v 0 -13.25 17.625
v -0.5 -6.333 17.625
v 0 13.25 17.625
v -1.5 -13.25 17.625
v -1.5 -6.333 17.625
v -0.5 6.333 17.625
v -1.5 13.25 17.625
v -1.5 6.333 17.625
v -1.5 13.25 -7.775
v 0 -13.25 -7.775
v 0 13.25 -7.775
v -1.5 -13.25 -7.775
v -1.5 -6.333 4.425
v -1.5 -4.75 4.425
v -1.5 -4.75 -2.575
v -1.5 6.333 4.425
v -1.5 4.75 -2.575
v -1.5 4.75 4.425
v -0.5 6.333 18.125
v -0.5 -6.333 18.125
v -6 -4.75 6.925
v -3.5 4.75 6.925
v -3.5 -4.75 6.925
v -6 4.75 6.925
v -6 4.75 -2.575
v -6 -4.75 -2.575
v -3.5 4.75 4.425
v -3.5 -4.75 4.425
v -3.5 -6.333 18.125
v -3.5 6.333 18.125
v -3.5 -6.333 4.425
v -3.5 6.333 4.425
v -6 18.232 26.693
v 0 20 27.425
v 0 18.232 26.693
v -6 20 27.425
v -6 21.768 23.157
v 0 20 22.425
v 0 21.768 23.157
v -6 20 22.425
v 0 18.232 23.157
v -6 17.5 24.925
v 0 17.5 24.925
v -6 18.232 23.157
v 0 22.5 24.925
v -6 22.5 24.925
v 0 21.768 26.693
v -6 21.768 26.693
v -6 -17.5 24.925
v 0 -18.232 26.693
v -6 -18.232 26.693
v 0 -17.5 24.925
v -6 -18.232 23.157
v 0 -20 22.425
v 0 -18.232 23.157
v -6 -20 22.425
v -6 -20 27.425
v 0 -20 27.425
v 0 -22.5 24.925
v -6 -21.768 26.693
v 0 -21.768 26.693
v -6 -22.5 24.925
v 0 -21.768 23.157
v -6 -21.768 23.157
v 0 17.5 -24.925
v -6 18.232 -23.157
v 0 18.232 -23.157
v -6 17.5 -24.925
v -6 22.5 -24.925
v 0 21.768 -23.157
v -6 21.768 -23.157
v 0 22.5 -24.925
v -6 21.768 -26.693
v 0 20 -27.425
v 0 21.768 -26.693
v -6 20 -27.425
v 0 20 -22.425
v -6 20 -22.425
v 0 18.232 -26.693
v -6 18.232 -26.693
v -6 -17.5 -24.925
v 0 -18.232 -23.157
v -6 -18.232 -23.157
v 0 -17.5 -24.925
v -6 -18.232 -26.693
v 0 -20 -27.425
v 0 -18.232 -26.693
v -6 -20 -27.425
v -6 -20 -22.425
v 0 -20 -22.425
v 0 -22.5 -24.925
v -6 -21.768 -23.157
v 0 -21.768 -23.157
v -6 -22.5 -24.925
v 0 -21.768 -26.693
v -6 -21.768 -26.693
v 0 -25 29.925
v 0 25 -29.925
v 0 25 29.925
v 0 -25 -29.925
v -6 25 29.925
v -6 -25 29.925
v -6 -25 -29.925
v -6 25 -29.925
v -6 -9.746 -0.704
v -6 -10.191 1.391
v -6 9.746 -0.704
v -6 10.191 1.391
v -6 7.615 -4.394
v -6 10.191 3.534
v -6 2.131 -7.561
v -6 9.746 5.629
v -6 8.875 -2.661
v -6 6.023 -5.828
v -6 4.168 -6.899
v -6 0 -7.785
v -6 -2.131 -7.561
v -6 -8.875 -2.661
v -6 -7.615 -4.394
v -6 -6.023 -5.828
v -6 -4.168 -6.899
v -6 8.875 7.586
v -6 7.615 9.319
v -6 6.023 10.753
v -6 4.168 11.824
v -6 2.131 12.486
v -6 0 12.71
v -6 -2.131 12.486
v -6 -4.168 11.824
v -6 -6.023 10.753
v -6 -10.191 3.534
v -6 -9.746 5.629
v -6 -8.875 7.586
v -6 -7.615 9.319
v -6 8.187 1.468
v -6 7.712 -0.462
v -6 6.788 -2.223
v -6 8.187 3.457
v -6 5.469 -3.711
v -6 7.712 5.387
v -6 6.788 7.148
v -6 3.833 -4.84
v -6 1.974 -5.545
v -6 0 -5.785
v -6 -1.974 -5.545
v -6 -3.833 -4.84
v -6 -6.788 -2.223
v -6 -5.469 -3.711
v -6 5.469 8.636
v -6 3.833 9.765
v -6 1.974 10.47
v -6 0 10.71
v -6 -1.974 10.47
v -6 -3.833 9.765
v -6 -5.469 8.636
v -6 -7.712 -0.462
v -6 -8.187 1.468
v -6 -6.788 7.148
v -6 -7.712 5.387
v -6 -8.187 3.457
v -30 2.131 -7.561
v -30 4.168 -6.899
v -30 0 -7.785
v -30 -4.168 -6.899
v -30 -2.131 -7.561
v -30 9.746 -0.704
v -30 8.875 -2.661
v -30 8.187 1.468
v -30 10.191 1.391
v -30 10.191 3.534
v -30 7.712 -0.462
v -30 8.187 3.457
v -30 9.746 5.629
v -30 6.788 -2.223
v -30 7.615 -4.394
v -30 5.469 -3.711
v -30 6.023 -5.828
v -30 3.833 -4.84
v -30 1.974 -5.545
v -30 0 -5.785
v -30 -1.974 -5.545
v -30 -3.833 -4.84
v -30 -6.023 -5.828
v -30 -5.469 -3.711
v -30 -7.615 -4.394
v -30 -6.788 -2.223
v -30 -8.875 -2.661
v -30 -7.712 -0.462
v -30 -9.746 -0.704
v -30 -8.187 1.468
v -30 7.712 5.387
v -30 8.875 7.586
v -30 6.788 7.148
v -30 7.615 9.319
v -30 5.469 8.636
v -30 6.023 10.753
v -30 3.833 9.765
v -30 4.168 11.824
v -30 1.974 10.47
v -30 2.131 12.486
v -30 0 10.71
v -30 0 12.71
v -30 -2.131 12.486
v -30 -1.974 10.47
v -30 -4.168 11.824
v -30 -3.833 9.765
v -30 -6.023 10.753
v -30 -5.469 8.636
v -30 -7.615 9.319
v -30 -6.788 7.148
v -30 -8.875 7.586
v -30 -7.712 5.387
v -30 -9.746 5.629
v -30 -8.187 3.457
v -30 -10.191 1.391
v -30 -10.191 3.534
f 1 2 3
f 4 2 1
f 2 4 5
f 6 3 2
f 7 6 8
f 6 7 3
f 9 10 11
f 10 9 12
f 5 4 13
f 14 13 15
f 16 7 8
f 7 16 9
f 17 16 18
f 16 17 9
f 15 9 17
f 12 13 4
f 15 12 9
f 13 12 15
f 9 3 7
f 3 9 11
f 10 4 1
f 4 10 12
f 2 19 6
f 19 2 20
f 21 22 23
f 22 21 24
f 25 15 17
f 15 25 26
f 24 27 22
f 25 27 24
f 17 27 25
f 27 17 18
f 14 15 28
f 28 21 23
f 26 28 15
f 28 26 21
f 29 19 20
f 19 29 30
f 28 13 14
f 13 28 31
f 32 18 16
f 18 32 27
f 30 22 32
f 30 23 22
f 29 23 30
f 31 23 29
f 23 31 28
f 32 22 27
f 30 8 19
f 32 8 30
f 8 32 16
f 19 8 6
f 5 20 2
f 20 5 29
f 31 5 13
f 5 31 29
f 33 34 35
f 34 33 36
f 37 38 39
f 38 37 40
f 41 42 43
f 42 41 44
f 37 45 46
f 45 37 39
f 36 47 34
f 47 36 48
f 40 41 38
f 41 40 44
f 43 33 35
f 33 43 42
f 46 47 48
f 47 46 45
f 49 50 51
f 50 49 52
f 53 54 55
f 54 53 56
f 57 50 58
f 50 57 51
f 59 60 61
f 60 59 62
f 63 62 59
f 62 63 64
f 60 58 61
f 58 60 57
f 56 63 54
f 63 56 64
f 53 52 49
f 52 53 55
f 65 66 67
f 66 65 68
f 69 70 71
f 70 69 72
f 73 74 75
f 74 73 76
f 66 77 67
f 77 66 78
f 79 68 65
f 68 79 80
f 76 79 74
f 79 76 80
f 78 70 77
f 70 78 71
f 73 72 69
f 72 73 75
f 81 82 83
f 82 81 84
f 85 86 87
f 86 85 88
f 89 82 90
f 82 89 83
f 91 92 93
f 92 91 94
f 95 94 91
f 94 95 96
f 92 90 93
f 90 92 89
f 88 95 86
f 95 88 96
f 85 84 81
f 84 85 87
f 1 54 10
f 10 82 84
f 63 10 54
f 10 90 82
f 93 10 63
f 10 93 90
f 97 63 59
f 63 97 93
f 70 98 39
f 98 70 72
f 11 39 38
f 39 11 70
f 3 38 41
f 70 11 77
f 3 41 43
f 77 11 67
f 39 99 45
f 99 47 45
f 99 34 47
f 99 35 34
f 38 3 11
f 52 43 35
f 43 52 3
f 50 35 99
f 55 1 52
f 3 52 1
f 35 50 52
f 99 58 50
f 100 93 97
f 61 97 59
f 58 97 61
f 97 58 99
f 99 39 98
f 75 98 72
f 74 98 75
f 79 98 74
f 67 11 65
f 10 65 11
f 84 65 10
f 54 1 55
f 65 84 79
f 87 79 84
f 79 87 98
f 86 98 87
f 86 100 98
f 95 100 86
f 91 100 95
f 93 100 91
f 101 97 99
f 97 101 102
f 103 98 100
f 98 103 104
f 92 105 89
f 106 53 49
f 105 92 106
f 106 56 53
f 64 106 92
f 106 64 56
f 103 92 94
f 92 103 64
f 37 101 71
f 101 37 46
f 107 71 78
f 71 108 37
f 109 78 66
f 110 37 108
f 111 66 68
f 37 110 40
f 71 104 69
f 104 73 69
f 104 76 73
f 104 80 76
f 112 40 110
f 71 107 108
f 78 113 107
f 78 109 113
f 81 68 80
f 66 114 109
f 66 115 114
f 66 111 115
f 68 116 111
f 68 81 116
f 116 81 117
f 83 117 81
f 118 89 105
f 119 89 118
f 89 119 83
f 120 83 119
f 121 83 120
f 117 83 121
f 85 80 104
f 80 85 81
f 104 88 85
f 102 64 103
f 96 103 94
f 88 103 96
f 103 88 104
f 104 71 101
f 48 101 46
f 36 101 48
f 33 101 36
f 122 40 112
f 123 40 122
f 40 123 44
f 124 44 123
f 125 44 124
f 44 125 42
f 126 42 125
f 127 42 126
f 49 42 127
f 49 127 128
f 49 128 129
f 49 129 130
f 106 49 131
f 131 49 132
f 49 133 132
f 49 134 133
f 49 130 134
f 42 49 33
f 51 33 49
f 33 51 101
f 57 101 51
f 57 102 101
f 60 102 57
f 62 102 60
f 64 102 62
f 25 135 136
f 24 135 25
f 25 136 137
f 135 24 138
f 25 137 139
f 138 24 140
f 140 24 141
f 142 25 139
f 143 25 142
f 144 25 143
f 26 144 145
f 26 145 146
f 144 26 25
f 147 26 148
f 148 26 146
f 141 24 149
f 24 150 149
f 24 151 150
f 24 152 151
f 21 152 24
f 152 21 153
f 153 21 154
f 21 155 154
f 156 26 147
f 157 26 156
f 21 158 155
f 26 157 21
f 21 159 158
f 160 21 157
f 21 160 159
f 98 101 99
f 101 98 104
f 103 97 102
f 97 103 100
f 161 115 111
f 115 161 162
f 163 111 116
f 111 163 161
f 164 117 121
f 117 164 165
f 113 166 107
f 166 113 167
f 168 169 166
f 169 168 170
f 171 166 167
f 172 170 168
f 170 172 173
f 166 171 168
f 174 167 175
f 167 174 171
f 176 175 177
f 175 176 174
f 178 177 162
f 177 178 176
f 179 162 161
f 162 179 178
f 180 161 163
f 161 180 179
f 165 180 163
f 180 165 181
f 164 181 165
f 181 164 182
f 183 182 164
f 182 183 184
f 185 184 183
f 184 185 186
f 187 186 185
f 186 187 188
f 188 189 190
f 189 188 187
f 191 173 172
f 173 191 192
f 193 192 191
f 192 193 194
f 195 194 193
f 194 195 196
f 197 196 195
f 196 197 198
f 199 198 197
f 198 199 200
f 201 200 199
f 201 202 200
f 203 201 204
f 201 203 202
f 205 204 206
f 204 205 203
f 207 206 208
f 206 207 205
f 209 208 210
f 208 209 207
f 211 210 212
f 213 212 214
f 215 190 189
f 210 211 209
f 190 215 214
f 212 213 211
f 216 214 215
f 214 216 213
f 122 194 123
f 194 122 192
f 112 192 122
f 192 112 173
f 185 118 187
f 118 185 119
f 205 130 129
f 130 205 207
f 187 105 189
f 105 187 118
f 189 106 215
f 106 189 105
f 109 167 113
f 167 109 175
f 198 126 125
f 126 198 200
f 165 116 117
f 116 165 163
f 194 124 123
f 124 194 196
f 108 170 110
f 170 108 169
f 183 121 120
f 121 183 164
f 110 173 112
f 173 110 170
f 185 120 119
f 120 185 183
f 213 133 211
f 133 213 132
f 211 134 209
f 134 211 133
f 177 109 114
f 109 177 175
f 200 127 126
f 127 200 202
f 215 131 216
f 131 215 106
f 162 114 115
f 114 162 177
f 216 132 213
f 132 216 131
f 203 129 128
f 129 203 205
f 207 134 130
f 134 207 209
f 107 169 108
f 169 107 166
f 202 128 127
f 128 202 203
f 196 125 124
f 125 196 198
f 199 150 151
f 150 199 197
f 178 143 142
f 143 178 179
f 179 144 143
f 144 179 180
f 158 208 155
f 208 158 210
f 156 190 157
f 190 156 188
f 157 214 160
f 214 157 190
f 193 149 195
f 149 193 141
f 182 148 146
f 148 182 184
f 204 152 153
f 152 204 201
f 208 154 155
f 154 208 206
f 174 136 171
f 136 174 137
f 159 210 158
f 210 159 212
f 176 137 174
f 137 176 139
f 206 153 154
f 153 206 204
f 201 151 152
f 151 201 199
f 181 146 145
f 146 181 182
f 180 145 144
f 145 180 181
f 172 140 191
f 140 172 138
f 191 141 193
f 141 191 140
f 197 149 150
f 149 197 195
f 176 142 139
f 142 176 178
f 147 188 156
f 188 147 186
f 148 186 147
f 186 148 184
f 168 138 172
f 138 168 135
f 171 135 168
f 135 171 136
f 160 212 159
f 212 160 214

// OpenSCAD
// file: ../cameramount/PiCameraMount.scad
/*
 * openSCAD for a simple mount for the Raspberry PI Camera Module
 *
 * This file is not for standalone use - it's included in to another
 * openSCAN file for including in to another model.
 *
 * Copyright 2015 Peter T Mount
 * 
 * Licensed under the Apache License, Version 2.0 (the "License");
 * you may not use this file except in compliance with the License.
 * You may obtain a copy of the License at
 * 
 * http://www.apache.org/licenses/LICENSE-2.0
 * 
 * Unless required by applicable law or agreed to in writing, software
 * distributed under the License is distributed on an "AS IS" BASIS,
 * WITHOUT WARRANTIES OR CONDITIONS OF ANY KIND, either express or implied.
 * See the License for the specific language governing permissions and
 * limitations under the License.
 *
 */

/*
 * Measured dimensions of a PI Camera Module.
 *
 * These are based on actual measurements and those manually measured by Gert van Loo
 * and published on Scribd:
 *
 *		http://www.scribd.com/doc/142718448/Raspberry-Pi-Camera-Mechanical-Data
 *
 * Width & Depth are the exterior dimensions, width being the edge with the ribbon.
 *
 * We add 1.5 to these to give some room and account for the printer as it seems
 * to give a better fit.
 *
 * y offset is the height from the bottom of the center of the camera lens.
 *
 * ribbon width is just that, if required
 */
piCameraWidth=25 +1.5;
piCameraDepth=23.9 +1.5;
piCameraRibbonWidth=16.2 +0.5;
piCameraLensSize=8 +1.5;
piCameraYOffset=5.1+(piCameraLensSize/2);

/*
 * Module to render a PI camera mount.
 *
 * To use translate it into the required position so that the camera lens
 * is at the origin & pointing along the x axis.
 *
 * Then call piCameraMount(radius,mode)
 *
 * Where:
 *		width	the width of the component
 *		mode	The mode of the render
 *
 * The width must be >30mm as it's used to include the mounting hardware.
 * However you can enlarge it.
 *
 * The mode defines how it's rendered:
 *		0	Render the front panel
 *		1	Render the back panel
 *		2	Render a plain panel with just the mounting holes
 *    3	As 1 but cable exit on back is internal rather than at the bottom of the plate
 */

module piCamera(width,mode) {
	assign(
		tubeRadius=width/2,
		piCameraLensHalf=piCameraLensSize/2,
		piCameraWHalf=piCameraWidth/2,
		piCameraDHalf=piCameraDepth/2,
		offset=piCameraYOffset
	) {
		translate([0,0,piCameraYOffset/2]) union() {
			// Front panel
			difference() {
				if(mode==1 || mode==3)
					translate([6,-tubeRadius,-tubeRadius-offset]) cube([6,width,width+offset]);
				else
					translate([0,-tubeRadius,-tubeRadius-offset]) cube([6,width,width+offset]);

//				translate([4,-tubeRadius-1,-tubeRadius-offset-1]) cube([2,width+2,width+offset+2]);

				if(mode!=2) {
					// Holder for the pi camera module
					translate([4.5,-piCameraWHalf,-piCameraDHalf])
						cube([2.2,piCameraWidth,piCameraDepth]);

					// Holder for components on rear of module
					translate([6,1-piCameraWHalf,1-piCameraDHalf])
						cube([3,piCameraWidth-2,piCameraDepth-2]);
					translate([6,-piCameraWHalf,-piCameraDHalf])
						cube([3,piCameraWidth,9.5]);

					// Hole for the camera lens
					translate([-0.5,-piCameraLensHalf,2-piCameraLensSize])
						cube([6,piCameraLensSize,piCameraLensSize]);

					// Indent for ribbon holder on front of the module
					translate([2.5,-piCameraLensSize*2/3,-0.5])
						cube([3,piCameraLensSize*4/3,piCameraDHalf+1]);
		
					// Space for ribbon cable
					if(mode==1)
						translate([ 5, -piCameraRibbonWidth/2,-tubeRadius-1-offset])
							cube([3,piCameraRibbonWidth,tubeRadius+1+offset]);
					else if(mode==3) {
						translate([ 5, -piCameraRibbonWidth/2,14-tubeRadius-1-offset])
							cube([4,piCameraRibbonWidth,15]);
						translate([ 5, -piCameraRibbonWidth/2,14-tubeRadius-1-offset])
							cube([10,piCameraRibbonWidth,5]);
					}
				}

				// M4 mounting holes
				piCameraHoles(width,15);
			}
		}

	}
}

module piCameraHoles(width,h) {
	assign(tubeRadius=width/2) {
		for(h=[0:3])
			translate([-1,
				(h%2) ? (-tubeRadius+5) : (tubeRadius-5),
				(floor(h/2)) ? (-tubeRadius+5-piCameraYOffset) : (tubeRadius-5)
			])
			rotate([0,90,0])
			cylinder(h=15,r=2.5);
	}
}
// file: ../Common.scad
/*
 * openSCAD Common features
 *
 * This file is not for standalone use - it's included in to another
 * openSCAN file for including in to another model.
 *
 * Copyright 2015 Peter T Mount
 * 
 * Licensed under the Apache License, Version 2.0 (the "License");
 * you may not use this file except in compliance with the License.
 * You may obtain a copy of the License at
 * 
 * http://www.apache.org/licenses/LICENSE-2.0
 * 
 * Unless required by applicable law or agreed to in writing, software
 * distributed under the License is distributed on an "AS IS" BASIS,
 * WITHOUT WARRANTIES OR CONDITIONS OF ANY KIND, either express or implied.
 * See the License for the specific language governing permissions and
 * limitations under the License.
 *
 */

/*
 * Bolt sizes - these are for the holes hence +0.25mm, measurements in radius
 */
M4=2.25;
M5=2.75;
M6=3.25;
// file: eyepiece.scad
/*
 * openSCAD for an adapter for attaching the Raspberry PI Camera Module 
 * to a telescope.
 *
 * This model comes in two parts, the eyepiece mount which attaches directly
 * to the telescope (no eyepiece required) and the back plate.
 *
 * However it's intended that the backplate be incorporated into another model
 * so that the PI itself is mounted with the camera.
 *
 * Copyright 2015 Peter T Mount
 * 
 * Licensed under the Apache License, Version 2.0 (the "License");
 * you may not use this file except in compliance with the License.
 * You may obtain a copy of the License at
 * 
 * http://www.apache.org/licenses/LICENSE-2.0
 * 
 * Unless required by applicable law or agreed to in writing, software
 * distributed under the License is distributed on an "AS IS" BASIS,
 * WITHOUT WARRANTIES OR CONDITIONS OF ANY KIND, either express or implied.
 * See the License for the specific language governing permissions and
 * limitations under the License.
 *
 */

include <../Common.scad>
include <../cameramount/PiCameraMount.scad>

module eyepiece(diam,mode) {
	// eyediam is the eyepiece diameter, adjusting for extruder diameter
	assign(
		eyediam=(diam*25.4)-3
	) {
		assign(
			eyerad=eyediam/2,
			eyewidth=max(50,eyediam+10)
		) {
			if(mode==0 || mode==2) translate([-6,0,0]) eyepieceFront(eyewidth,eyerad);
			if(mode==1 || mode==2) translate([-6,0,0]) eyepieceBack(eyewidth);
			if(mode==3) {
			  	translate([6,0,0]) rotate([0,0,180]) eyepieceFront(eyewidth,eyerad);
				translate([-6,-eyewidth*3/2,0]) eyepieceBack(eyewidth);
			}
		}
	}
}

module eyepieceFront(eyewidth,eyerad) {
	union() {
		piCamera(eyewidth,0);
		translate([-24,0,piCameraYOffset/4]) rotate([0,90,0]) difference() {
			cylinder( h=24,r=eyerad);
			translate([0,0,-2]) cylinder( h=27,r=eyerad-2);
		}
	}
}

module eyepieceBack(eyewidth) {
	piCamera(eyewidth,3);
}
// main file
/*
 * openSCAD for an adapter for attaching the Raspberry PI Camera Module 
 * to a telescope.
 *
 * This model comes in two parts, the eyepiece mount which attaches directly
 * to the telescope (no eyepiece required) and the back plate.
 *
 * However it's intended that the backplate be incorporated into another model
 * so that the PI itself is mounted with the camera.
 *
 * Copyright 2015 Peter T Mount
 * 
 * Licensed under the Apache License, Version 2.0 (the "License");
 * you may not use this file except in compliance with the License.
 * You may obtain a copy of the License at
 * 
 * http://www.apache.org/licenses/LICENSE-2.0
 * 
 * Unless required by applicable law or agreed to in writing, software
 * distributed under the License is distributed on an "AS IS" BASIS,
 * WITHOUT WARRANTIES OR CONDITIONS OF ANY KIND, either express or implied.
 * See the License for the specific language governing permissions and
 * limitations under the License.
 *
 */

include <eyepiece.scad>

eyepiece(0.925,0);
